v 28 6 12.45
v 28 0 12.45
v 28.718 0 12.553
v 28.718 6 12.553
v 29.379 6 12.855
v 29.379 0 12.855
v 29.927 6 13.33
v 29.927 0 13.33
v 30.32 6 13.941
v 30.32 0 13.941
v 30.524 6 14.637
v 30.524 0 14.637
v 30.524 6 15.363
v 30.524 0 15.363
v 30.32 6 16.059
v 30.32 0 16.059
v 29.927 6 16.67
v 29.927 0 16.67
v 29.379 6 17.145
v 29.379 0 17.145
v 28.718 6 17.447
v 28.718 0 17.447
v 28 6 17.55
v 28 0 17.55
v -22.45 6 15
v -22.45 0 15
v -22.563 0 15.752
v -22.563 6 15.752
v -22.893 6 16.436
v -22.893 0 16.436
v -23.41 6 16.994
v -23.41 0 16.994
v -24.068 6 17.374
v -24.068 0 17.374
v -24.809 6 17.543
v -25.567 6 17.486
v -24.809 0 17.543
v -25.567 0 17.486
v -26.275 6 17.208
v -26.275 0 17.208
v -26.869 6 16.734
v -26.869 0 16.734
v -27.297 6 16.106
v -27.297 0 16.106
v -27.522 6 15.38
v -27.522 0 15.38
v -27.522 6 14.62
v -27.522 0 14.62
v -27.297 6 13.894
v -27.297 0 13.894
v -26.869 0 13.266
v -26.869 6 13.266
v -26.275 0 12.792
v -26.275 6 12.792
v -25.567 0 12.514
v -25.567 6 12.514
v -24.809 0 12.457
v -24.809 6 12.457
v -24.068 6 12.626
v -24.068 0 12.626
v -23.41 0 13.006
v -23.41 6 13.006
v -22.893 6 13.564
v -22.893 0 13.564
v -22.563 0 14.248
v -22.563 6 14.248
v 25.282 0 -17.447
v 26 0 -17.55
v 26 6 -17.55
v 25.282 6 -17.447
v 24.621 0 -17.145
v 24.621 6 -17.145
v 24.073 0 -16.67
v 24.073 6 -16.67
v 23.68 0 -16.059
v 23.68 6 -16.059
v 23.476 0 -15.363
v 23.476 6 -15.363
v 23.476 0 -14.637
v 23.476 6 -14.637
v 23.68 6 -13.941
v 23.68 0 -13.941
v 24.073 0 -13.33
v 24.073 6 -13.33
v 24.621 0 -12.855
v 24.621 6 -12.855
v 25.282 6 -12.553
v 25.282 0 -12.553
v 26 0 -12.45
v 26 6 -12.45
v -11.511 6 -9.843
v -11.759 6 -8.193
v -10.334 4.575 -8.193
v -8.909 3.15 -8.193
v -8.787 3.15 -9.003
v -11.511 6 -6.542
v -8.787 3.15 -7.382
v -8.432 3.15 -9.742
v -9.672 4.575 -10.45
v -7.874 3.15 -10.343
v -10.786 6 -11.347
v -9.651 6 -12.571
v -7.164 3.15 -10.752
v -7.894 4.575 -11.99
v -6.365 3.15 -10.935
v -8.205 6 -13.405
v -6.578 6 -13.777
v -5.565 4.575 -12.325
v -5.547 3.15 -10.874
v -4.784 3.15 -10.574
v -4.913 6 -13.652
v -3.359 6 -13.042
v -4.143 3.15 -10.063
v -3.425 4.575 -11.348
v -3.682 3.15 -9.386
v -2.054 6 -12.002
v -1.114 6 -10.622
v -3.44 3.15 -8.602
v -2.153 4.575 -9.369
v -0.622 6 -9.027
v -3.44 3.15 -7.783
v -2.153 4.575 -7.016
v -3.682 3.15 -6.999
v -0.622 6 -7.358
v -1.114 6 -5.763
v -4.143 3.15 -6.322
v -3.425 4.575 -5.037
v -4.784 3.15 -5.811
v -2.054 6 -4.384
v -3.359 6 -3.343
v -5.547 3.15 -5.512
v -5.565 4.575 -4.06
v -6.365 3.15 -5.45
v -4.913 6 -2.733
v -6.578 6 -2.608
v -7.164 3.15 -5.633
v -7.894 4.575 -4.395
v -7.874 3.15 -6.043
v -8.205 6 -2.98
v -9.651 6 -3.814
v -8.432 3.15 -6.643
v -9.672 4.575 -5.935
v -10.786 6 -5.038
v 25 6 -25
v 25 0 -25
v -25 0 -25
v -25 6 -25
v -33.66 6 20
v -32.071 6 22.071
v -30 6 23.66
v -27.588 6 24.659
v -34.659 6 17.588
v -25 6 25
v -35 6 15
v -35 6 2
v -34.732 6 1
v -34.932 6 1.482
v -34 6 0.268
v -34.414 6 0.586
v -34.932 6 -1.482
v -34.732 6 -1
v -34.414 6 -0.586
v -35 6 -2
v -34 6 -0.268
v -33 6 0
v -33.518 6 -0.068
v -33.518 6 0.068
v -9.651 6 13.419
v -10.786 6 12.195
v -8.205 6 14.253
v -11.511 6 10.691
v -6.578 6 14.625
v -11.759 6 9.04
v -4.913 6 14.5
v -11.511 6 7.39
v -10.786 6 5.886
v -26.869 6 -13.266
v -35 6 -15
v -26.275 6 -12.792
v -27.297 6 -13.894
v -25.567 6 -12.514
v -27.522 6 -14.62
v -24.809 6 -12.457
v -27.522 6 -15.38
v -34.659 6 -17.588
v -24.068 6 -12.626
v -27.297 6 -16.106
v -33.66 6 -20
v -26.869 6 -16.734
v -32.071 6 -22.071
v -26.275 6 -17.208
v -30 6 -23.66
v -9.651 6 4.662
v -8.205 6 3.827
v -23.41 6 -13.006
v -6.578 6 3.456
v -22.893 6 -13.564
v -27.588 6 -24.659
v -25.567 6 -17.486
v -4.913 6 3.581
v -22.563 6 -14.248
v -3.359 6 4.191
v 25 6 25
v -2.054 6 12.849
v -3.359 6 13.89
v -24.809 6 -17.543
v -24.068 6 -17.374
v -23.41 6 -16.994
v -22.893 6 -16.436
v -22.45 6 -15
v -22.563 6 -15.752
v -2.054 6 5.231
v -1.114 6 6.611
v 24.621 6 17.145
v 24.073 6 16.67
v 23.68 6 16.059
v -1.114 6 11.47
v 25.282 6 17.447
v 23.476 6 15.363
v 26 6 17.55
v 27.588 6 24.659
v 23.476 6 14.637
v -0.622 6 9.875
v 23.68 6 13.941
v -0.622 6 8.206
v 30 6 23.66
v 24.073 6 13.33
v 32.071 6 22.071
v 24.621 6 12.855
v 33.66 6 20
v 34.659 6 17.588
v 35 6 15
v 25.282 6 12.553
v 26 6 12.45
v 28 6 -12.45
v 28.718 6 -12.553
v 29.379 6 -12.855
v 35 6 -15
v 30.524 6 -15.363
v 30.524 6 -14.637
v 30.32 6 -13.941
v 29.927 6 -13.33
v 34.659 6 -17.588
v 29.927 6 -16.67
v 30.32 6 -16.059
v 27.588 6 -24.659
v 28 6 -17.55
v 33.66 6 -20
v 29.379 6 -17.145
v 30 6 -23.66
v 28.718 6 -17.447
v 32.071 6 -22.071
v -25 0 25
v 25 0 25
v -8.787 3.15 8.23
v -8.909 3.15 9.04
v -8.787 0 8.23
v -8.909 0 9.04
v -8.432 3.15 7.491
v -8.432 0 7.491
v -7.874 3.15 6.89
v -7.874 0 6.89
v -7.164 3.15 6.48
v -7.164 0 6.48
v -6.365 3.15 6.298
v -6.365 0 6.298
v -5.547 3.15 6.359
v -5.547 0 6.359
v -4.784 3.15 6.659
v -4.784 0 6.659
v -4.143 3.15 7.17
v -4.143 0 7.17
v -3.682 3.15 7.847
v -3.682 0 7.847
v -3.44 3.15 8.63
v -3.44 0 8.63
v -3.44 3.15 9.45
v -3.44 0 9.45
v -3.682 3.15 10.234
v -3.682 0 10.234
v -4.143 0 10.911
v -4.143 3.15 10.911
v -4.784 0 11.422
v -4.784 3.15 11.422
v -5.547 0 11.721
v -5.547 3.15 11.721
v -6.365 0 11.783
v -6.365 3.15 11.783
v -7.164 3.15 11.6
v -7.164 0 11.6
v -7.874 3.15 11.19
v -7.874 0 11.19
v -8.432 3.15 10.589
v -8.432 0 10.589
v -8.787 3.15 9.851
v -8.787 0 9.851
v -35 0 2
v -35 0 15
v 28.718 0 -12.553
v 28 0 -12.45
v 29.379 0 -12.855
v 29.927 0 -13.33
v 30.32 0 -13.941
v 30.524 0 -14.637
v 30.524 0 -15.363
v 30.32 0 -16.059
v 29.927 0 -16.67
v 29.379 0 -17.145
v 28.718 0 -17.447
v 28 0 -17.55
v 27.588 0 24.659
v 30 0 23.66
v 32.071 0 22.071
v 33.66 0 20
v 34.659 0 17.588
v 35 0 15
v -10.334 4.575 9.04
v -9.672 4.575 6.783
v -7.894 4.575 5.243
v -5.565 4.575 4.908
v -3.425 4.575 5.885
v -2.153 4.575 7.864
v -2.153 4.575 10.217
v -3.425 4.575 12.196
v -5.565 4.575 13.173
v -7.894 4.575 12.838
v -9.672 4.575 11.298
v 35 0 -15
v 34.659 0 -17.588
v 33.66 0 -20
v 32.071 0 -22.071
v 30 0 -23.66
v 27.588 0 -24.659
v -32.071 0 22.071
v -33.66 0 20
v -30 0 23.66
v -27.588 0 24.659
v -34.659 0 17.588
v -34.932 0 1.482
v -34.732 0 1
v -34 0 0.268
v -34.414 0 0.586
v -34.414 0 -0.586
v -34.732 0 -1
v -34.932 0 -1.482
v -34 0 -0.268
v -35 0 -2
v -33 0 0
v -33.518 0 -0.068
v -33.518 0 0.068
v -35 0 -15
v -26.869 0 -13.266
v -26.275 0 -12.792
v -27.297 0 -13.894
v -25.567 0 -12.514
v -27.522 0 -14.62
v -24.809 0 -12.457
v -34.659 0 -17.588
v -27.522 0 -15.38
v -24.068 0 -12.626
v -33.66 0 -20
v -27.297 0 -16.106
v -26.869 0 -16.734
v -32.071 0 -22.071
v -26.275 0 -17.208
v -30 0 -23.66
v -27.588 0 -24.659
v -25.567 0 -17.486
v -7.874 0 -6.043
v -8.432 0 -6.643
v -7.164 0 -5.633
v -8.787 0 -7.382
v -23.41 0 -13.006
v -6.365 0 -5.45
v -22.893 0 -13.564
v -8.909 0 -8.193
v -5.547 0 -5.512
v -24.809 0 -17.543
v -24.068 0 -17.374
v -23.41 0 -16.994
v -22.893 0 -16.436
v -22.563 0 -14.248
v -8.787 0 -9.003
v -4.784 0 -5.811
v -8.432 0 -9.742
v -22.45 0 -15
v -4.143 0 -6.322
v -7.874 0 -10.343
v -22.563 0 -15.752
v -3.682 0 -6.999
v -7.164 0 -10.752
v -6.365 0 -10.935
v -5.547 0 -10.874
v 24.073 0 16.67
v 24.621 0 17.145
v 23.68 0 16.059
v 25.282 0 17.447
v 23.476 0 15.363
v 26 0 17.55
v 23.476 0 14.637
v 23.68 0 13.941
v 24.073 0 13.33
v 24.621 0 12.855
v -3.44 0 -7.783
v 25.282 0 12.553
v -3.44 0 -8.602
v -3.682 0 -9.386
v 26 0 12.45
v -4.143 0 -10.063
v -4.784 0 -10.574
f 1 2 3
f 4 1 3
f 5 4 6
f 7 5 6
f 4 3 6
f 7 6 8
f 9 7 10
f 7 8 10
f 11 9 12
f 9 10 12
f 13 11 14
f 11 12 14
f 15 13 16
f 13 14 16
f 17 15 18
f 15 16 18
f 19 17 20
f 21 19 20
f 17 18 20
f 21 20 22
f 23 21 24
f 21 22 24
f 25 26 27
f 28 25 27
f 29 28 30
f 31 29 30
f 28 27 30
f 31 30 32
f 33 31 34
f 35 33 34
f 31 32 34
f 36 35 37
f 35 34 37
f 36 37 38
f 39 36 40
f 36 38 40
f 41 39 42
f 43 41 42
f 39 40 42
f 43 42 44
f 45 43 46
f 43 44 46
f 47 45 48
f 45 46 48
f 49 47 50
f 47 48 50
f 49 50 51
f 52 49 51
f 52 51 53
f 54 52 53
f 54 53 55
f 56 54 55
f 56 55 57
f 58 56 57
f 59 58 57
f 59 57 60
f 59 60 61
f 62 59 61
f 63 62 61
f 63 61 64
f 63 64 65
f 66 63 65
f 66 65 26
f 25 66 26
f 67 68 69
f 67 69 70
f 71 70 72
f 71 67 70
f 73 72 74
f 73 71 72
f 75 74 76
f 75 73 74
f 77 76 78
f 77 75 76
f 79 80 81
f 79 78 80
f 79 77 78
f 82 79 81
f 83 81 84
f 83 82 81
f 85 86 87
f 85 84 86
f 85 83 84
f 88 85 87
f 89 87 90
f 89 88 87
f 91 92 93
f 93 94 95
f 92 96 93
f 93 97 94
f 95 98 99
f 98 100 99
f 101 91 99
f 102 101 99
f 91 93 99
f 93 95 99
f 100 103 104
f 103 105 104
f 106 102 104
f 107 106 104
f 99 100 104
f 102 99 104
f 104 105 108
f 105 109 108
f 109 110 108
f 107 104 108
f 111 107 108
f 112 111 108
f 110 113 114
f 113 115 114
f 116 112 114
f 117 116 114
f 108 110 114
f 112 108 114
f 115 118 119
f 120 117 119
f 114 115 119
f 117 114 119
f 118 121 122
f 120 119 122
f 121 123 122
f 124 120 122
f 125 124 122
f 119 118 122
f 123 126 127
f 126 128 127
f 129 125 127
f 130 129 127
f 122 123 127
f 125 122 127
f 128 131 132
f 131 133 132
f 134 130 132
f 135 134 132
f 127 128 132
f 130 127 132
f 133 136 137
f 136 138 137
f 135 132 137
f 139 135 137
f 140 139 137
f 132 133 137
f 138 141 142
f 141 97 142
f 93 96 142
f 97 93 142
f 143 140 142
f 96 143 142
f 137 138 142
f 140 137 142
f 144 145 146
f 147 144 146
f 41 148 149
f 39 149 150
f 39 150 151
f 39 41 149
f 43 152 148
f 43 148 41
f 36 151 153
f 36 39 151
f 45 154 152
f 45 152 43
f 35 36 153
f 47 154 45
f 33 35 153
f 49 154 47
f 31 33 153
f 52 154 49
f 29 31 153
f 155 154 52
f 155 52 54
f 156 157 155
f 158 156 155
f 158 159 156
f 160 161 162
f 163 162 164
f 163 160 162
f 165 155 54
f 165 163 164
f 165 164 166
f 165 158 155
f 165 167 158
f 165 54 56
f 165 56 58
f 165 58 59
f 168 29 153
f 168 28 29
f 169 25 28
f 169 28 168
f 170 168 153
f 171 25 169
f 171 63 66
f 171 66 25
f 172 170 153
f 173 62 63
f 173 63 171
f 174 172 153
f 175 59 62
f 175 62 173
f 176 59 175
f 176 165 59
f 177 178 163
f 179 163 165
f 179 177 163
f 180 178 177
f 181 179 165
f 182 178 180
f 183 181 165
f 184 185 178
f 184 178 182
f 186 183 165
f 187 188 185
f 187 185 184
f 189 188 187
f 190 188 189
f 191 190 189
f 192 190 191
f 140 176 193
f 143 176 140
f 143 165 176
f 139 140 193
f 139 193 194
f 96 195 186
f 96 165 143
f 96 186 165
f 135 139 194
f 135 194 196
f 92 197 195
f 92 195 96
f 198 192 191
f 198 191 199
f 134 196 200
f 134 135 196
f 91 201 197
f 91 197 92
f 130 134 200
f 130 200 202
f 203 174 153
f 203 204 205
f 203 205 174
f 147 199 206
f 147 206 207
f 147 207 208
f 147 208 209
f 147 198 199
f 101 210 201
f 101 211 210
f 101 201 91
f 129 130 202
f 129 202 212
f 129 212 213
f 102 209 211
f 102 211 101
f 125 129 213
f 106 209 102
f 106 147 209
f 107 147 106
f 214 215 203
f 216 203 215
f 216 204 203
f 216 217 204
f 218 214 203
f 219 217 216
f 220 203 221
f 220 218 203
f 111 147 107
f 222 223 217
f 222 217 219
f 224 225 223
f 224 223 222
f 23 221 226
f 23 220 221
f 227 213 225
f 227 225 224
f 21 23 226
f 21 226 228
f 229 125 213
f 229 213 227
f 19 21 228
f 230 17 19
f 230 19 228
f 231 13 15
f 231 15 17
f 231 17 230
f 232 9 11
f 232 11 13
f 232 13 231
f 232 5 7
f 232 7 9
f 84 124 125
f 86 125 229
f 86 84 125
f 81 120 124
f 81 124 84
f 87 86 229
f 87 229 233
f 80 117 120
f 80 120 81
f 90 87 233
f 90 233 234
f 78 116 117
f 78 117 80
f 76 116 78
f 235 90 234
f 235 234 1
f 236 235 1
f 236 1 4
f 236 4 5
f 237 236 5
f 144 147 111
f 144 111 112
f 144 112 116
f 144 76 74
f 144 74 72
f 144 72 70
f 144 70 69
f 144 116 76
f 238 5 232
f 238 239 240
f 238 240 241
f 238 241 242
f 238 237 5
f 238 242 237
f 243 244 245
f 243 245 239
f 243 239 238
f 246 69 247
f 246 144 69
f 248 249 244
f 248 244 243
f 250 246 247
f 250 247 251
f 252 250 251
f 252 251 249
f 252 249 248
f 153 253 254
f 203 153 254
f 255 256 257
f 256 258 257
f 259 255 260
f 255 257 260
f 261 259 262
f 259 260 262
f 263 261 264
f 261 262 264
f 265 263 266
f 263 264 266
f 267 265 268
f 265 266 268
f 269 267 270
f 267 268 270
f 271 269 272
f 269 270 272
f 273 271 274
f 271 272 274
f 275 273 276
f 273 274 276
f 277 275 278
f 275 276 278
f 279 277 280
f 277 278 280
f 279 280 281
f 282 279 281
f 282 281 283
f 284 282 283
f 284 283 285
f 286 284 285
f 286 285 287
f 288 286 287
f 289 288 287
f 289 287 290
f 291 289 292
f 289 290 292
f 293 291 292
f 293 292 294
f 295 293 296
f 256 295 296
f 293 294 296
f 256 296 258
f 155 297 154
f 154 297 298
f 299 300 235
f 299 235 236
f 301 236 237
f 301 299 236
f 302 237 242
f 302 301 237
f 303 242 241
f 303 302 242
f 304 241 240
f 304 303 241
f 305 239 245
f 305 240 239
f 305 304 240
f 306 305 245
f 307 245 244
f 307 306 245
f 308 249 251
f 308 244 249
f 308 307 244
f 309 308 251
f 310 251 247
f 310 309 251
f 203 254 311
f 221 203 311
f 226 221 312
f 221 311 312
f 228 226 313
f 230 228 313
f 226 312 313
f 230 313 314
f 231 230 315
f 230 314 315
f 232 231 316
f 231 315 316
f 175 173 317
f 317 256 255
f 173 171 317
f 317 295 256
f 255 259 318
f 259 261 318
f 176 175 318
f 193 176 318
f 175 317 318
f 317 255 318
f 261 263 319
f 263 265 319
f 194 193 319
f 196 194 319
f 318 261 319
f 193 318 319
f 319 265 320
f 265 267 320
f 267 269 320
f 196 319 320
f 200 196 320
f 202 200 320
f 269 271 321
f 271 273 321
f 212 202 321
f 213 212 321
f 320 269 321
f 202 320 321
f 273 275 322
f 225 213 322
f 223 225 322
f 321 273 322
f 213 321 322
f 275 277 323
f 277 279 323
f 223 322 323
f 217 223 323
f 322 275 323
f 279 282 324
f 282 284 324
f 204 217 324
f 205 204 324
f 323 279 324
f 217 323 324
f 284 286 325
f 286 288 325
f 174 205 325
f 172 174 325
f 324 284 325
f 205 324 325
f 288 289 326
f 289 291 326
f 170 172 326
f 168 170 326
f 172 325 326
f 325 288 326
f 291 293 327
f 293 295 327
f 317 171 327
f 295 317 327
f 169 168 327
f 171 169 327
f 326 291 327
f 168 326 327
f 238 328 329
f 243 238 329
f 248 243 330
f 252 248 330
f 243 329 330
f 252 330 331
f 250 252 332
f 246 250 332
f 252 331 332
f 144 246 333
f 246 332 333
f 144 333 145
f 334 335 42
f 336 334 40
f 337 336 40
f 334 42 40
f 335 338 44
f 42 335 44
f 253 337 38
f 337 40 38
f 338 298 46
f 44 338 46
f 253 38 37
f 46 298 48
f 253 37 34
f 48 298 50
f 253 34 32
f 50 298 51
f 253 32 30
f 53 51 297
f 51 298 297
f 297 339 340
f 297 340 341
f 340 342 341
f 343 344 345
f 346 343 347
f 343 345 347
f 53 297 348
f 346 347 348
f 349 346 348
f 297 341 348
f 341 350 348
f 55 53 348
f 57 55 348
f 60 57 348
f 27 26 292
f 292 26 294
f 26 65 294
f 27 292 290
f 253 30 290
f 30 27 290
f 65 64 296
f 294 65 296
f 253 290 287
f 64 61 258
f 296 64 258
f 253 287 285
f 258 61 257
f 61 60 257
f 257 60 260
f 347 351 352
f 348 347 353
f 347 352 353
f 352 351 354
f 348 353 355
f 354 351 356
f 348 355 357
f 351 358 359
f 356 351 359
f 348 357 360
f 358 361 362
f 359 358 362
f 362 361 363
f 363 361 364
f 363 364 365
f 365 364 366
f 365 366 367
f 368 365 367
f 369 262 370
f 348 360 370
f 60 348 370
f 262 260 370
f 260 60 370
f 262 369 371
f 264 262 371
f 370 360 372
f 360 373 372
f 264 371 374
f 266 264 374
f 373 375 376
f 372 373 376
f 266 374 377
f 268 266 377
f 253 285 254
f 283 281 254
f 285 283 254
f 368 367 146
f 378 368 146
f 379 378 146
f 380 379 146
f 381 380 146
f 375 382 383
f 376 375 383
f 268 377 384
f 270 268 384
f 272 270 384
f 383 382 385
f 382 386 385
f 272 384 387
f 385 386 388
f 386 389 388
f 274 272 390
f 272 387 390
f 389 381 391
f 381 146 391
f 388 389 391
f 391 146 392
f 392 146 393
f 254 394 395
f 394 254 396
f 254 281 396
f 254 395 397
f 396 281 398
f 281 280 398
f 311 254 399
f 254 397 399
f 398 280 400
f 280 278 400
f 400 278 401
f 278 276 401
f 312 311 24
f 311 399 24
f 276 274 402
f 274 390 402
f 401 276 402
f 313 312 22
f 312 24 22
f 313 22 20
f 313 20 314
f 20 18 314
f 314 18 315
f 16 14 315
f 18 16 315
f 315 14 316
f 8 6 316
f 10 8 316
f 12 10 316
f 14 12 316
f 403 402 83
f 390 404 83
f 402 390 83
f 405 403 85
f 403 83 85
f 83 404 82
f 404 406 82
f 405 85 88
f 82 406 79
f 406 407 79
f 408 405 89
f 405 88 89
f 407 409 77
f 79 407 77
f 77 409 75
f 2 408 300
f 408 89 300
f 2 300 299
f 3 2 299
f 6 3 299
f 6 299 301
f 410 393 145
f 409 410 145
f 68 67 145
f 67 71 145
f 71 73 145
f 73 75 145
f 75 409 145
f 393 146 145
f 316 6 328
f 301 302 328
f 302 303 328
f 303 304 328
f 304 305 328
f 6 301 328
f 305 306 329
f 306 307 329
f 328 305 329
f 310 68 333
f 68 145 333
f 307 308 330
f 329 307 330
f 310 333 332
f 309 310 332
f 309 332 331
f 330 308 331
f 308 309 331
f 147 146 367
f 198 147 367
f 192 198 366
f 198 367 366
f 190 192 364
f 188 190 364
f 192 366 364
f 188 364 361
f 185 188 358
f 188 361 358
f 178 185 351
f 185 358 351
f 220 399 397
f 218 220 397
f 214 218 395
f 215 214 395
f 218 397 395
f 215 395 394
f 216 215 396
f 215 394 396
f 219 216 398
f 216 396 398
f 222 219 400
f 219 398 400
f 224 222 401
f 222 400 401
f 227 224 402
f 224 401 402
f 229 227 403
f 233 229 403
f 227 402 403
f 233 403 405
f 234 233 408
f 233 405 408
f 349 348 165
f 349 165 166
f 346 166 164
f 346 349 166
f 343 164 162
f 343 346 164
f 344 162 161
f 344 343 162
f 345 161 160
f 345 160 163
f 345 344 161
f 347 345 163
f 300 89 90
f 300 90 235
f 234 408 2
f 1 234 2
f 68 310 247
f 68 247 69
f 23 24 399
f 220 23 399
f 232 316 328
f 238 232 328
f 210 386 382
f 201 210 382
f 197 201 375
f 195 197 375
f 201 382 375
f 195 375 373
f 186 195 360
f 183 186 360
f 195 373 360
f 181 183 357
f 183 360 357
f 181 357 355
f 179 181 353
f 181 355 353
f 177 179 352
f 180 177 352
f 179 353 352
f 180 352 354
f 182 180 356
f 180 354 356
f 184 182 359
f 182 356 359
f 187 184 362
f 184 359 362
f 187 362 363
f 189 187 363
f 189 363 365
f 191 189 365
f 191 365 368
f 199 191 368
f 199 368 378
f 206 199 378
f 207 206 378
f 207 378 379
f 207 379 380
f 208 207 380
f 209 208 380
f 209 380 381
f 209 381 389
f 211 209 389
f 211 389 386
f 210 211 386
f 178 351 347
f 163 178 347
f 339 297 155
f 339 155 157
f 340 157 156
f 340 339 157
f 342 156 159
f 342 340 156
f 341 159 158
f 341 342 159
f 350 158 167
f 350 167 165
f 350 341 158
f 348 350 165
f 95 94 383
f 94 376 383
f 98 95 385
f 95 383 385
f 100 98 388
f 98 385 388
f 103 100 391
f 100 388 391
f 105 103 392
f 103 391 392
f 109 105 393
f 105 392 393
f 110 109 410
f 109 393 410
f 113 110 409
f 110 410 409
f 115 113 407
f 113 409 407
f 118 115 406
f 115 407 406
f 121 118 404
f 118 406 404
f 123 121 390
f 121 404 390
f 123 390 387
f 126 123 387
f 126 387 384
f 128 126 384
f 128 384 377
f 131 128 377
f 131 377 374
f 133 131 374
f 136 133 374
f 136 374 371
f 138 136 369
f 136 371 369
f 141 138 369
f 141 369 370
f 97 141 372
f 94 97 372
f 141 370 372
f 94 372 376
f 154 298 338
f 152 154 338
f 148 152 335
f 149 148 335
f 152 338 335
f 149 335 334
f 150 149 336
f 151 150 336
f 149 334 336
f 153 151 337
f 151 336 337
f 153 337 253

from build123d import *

# Parameters (mm, degrees)
EXTRUDE_1_DEPTH             = 6
SKETCH_2_R                  = 2.55
CUT_EXTRUDE_1_DEPTH         = 7
CUT_EXTRUDE_2_DEPTH         = 7
HOLE_WIZARD_M52_D           = 5.5
HOLE_WIZARD_M52_CSINK_D     = 11.2
HOLE_WIZARD_M52_CSINK_ANGLE = 90


with BuildPart() as part:
    # Эскиз1 → Бобышка-Вытянуть1 (new body)
    with BuildSketch(Plane(origin=(0, 0, 0), x_dir=(1, 0, 0), z_dir=(0, 1, 0))):
        with BuildLine():
            Line((-25, -25), (25, -25))
            ThreePointArc((25, -25), (32.071067812, -22.071067812), (35, -15))
            Line((35, -15), (35, 15))
            ThreePointArc((35, 15), (32.071067812, 22.071067812), (25, 25))
            Line((25, 25), (-25, 25))
            ThreePointArc((-25, 25), (-32.071067812, 22.071067812), (-35, 15))
            Line((-35, 15), (-35, -15))
            ThreePointArc((-35, -15), (-32.071067812, -22.071067812), (-25, -25))
        make_face()
    extrude(amount=EXTRUDE_1_DEPTH)

    # Эскиз2 → Вырез-Вытянуть1 (cut, through all)
    with BuildSketch(Plane.XZ):
        with Locations((-25, -15)):
            Circle(SKETCH_2_R)
        with Locations((-25, 15)):
            Circle(SKETCH_2_R)
        with BuildLine():
            Line((28, -17.55), (26, -17.55))
            ThreePointArc((26, -17.55), (23.45, -15), (26, -12.45))
            Line((26, -12.45), (28, -12.45))
            ThreePointArc((28, -12.45), (30.55, -15), (28, -17.55))
        make_face()
        with BuildLine():
            Line((28, 17.55), (26, 17.55))
            ThreePointArc((26, 17.55), (23.45, 15), (26, 12.45))
            Line((26, 12.45), (28, 12.45))
            ThreePointArc((28, 12.45), (30.55, 15), (28, 17.55))
        make_face()
    extrude(amount=-CUT_EXTRUDE_1_DEPTH, mode=Mode.SUBTRACT)

    # Эскиз3 → Вырез-Вытянуть2 (cut, through all)
    with BuildSketch(Plane.XZ):
        with BuildLine():
            Line((-35, -2), (-35, 2))
            ThreePointArc((-35, 2), (-34.414213562, 0.585786438), (-33, 0))
            ThreePointArc((-33, 0), (-34.414213562, -0.585786438), (-35, -2))
        make_face()
    extrude(amount=-CUT_EXTRUDE_2_DEPTH, mode=Mode.SUBTRACT)

    # Зенковка для  винта с потайной головкой с внутренним шестигранником M52 (through all)
    with Locations(Plane(origin=(0, 6, 0), x_dir=(1, 0, 0), z_dir=(0, 1, 0))):
        with Locations((-6.159381211, -9.040339254), (-6.159381211, 8.192585184)):
            CounterSinkHole(HOLE_WIZARD_M52_D / 2, HOLE_WIZARD_M52_CSINK_D / 2, counter_sink_angle=HOLE_WIZARD_M52_CSINK_ANGLE)


solid = part.part
